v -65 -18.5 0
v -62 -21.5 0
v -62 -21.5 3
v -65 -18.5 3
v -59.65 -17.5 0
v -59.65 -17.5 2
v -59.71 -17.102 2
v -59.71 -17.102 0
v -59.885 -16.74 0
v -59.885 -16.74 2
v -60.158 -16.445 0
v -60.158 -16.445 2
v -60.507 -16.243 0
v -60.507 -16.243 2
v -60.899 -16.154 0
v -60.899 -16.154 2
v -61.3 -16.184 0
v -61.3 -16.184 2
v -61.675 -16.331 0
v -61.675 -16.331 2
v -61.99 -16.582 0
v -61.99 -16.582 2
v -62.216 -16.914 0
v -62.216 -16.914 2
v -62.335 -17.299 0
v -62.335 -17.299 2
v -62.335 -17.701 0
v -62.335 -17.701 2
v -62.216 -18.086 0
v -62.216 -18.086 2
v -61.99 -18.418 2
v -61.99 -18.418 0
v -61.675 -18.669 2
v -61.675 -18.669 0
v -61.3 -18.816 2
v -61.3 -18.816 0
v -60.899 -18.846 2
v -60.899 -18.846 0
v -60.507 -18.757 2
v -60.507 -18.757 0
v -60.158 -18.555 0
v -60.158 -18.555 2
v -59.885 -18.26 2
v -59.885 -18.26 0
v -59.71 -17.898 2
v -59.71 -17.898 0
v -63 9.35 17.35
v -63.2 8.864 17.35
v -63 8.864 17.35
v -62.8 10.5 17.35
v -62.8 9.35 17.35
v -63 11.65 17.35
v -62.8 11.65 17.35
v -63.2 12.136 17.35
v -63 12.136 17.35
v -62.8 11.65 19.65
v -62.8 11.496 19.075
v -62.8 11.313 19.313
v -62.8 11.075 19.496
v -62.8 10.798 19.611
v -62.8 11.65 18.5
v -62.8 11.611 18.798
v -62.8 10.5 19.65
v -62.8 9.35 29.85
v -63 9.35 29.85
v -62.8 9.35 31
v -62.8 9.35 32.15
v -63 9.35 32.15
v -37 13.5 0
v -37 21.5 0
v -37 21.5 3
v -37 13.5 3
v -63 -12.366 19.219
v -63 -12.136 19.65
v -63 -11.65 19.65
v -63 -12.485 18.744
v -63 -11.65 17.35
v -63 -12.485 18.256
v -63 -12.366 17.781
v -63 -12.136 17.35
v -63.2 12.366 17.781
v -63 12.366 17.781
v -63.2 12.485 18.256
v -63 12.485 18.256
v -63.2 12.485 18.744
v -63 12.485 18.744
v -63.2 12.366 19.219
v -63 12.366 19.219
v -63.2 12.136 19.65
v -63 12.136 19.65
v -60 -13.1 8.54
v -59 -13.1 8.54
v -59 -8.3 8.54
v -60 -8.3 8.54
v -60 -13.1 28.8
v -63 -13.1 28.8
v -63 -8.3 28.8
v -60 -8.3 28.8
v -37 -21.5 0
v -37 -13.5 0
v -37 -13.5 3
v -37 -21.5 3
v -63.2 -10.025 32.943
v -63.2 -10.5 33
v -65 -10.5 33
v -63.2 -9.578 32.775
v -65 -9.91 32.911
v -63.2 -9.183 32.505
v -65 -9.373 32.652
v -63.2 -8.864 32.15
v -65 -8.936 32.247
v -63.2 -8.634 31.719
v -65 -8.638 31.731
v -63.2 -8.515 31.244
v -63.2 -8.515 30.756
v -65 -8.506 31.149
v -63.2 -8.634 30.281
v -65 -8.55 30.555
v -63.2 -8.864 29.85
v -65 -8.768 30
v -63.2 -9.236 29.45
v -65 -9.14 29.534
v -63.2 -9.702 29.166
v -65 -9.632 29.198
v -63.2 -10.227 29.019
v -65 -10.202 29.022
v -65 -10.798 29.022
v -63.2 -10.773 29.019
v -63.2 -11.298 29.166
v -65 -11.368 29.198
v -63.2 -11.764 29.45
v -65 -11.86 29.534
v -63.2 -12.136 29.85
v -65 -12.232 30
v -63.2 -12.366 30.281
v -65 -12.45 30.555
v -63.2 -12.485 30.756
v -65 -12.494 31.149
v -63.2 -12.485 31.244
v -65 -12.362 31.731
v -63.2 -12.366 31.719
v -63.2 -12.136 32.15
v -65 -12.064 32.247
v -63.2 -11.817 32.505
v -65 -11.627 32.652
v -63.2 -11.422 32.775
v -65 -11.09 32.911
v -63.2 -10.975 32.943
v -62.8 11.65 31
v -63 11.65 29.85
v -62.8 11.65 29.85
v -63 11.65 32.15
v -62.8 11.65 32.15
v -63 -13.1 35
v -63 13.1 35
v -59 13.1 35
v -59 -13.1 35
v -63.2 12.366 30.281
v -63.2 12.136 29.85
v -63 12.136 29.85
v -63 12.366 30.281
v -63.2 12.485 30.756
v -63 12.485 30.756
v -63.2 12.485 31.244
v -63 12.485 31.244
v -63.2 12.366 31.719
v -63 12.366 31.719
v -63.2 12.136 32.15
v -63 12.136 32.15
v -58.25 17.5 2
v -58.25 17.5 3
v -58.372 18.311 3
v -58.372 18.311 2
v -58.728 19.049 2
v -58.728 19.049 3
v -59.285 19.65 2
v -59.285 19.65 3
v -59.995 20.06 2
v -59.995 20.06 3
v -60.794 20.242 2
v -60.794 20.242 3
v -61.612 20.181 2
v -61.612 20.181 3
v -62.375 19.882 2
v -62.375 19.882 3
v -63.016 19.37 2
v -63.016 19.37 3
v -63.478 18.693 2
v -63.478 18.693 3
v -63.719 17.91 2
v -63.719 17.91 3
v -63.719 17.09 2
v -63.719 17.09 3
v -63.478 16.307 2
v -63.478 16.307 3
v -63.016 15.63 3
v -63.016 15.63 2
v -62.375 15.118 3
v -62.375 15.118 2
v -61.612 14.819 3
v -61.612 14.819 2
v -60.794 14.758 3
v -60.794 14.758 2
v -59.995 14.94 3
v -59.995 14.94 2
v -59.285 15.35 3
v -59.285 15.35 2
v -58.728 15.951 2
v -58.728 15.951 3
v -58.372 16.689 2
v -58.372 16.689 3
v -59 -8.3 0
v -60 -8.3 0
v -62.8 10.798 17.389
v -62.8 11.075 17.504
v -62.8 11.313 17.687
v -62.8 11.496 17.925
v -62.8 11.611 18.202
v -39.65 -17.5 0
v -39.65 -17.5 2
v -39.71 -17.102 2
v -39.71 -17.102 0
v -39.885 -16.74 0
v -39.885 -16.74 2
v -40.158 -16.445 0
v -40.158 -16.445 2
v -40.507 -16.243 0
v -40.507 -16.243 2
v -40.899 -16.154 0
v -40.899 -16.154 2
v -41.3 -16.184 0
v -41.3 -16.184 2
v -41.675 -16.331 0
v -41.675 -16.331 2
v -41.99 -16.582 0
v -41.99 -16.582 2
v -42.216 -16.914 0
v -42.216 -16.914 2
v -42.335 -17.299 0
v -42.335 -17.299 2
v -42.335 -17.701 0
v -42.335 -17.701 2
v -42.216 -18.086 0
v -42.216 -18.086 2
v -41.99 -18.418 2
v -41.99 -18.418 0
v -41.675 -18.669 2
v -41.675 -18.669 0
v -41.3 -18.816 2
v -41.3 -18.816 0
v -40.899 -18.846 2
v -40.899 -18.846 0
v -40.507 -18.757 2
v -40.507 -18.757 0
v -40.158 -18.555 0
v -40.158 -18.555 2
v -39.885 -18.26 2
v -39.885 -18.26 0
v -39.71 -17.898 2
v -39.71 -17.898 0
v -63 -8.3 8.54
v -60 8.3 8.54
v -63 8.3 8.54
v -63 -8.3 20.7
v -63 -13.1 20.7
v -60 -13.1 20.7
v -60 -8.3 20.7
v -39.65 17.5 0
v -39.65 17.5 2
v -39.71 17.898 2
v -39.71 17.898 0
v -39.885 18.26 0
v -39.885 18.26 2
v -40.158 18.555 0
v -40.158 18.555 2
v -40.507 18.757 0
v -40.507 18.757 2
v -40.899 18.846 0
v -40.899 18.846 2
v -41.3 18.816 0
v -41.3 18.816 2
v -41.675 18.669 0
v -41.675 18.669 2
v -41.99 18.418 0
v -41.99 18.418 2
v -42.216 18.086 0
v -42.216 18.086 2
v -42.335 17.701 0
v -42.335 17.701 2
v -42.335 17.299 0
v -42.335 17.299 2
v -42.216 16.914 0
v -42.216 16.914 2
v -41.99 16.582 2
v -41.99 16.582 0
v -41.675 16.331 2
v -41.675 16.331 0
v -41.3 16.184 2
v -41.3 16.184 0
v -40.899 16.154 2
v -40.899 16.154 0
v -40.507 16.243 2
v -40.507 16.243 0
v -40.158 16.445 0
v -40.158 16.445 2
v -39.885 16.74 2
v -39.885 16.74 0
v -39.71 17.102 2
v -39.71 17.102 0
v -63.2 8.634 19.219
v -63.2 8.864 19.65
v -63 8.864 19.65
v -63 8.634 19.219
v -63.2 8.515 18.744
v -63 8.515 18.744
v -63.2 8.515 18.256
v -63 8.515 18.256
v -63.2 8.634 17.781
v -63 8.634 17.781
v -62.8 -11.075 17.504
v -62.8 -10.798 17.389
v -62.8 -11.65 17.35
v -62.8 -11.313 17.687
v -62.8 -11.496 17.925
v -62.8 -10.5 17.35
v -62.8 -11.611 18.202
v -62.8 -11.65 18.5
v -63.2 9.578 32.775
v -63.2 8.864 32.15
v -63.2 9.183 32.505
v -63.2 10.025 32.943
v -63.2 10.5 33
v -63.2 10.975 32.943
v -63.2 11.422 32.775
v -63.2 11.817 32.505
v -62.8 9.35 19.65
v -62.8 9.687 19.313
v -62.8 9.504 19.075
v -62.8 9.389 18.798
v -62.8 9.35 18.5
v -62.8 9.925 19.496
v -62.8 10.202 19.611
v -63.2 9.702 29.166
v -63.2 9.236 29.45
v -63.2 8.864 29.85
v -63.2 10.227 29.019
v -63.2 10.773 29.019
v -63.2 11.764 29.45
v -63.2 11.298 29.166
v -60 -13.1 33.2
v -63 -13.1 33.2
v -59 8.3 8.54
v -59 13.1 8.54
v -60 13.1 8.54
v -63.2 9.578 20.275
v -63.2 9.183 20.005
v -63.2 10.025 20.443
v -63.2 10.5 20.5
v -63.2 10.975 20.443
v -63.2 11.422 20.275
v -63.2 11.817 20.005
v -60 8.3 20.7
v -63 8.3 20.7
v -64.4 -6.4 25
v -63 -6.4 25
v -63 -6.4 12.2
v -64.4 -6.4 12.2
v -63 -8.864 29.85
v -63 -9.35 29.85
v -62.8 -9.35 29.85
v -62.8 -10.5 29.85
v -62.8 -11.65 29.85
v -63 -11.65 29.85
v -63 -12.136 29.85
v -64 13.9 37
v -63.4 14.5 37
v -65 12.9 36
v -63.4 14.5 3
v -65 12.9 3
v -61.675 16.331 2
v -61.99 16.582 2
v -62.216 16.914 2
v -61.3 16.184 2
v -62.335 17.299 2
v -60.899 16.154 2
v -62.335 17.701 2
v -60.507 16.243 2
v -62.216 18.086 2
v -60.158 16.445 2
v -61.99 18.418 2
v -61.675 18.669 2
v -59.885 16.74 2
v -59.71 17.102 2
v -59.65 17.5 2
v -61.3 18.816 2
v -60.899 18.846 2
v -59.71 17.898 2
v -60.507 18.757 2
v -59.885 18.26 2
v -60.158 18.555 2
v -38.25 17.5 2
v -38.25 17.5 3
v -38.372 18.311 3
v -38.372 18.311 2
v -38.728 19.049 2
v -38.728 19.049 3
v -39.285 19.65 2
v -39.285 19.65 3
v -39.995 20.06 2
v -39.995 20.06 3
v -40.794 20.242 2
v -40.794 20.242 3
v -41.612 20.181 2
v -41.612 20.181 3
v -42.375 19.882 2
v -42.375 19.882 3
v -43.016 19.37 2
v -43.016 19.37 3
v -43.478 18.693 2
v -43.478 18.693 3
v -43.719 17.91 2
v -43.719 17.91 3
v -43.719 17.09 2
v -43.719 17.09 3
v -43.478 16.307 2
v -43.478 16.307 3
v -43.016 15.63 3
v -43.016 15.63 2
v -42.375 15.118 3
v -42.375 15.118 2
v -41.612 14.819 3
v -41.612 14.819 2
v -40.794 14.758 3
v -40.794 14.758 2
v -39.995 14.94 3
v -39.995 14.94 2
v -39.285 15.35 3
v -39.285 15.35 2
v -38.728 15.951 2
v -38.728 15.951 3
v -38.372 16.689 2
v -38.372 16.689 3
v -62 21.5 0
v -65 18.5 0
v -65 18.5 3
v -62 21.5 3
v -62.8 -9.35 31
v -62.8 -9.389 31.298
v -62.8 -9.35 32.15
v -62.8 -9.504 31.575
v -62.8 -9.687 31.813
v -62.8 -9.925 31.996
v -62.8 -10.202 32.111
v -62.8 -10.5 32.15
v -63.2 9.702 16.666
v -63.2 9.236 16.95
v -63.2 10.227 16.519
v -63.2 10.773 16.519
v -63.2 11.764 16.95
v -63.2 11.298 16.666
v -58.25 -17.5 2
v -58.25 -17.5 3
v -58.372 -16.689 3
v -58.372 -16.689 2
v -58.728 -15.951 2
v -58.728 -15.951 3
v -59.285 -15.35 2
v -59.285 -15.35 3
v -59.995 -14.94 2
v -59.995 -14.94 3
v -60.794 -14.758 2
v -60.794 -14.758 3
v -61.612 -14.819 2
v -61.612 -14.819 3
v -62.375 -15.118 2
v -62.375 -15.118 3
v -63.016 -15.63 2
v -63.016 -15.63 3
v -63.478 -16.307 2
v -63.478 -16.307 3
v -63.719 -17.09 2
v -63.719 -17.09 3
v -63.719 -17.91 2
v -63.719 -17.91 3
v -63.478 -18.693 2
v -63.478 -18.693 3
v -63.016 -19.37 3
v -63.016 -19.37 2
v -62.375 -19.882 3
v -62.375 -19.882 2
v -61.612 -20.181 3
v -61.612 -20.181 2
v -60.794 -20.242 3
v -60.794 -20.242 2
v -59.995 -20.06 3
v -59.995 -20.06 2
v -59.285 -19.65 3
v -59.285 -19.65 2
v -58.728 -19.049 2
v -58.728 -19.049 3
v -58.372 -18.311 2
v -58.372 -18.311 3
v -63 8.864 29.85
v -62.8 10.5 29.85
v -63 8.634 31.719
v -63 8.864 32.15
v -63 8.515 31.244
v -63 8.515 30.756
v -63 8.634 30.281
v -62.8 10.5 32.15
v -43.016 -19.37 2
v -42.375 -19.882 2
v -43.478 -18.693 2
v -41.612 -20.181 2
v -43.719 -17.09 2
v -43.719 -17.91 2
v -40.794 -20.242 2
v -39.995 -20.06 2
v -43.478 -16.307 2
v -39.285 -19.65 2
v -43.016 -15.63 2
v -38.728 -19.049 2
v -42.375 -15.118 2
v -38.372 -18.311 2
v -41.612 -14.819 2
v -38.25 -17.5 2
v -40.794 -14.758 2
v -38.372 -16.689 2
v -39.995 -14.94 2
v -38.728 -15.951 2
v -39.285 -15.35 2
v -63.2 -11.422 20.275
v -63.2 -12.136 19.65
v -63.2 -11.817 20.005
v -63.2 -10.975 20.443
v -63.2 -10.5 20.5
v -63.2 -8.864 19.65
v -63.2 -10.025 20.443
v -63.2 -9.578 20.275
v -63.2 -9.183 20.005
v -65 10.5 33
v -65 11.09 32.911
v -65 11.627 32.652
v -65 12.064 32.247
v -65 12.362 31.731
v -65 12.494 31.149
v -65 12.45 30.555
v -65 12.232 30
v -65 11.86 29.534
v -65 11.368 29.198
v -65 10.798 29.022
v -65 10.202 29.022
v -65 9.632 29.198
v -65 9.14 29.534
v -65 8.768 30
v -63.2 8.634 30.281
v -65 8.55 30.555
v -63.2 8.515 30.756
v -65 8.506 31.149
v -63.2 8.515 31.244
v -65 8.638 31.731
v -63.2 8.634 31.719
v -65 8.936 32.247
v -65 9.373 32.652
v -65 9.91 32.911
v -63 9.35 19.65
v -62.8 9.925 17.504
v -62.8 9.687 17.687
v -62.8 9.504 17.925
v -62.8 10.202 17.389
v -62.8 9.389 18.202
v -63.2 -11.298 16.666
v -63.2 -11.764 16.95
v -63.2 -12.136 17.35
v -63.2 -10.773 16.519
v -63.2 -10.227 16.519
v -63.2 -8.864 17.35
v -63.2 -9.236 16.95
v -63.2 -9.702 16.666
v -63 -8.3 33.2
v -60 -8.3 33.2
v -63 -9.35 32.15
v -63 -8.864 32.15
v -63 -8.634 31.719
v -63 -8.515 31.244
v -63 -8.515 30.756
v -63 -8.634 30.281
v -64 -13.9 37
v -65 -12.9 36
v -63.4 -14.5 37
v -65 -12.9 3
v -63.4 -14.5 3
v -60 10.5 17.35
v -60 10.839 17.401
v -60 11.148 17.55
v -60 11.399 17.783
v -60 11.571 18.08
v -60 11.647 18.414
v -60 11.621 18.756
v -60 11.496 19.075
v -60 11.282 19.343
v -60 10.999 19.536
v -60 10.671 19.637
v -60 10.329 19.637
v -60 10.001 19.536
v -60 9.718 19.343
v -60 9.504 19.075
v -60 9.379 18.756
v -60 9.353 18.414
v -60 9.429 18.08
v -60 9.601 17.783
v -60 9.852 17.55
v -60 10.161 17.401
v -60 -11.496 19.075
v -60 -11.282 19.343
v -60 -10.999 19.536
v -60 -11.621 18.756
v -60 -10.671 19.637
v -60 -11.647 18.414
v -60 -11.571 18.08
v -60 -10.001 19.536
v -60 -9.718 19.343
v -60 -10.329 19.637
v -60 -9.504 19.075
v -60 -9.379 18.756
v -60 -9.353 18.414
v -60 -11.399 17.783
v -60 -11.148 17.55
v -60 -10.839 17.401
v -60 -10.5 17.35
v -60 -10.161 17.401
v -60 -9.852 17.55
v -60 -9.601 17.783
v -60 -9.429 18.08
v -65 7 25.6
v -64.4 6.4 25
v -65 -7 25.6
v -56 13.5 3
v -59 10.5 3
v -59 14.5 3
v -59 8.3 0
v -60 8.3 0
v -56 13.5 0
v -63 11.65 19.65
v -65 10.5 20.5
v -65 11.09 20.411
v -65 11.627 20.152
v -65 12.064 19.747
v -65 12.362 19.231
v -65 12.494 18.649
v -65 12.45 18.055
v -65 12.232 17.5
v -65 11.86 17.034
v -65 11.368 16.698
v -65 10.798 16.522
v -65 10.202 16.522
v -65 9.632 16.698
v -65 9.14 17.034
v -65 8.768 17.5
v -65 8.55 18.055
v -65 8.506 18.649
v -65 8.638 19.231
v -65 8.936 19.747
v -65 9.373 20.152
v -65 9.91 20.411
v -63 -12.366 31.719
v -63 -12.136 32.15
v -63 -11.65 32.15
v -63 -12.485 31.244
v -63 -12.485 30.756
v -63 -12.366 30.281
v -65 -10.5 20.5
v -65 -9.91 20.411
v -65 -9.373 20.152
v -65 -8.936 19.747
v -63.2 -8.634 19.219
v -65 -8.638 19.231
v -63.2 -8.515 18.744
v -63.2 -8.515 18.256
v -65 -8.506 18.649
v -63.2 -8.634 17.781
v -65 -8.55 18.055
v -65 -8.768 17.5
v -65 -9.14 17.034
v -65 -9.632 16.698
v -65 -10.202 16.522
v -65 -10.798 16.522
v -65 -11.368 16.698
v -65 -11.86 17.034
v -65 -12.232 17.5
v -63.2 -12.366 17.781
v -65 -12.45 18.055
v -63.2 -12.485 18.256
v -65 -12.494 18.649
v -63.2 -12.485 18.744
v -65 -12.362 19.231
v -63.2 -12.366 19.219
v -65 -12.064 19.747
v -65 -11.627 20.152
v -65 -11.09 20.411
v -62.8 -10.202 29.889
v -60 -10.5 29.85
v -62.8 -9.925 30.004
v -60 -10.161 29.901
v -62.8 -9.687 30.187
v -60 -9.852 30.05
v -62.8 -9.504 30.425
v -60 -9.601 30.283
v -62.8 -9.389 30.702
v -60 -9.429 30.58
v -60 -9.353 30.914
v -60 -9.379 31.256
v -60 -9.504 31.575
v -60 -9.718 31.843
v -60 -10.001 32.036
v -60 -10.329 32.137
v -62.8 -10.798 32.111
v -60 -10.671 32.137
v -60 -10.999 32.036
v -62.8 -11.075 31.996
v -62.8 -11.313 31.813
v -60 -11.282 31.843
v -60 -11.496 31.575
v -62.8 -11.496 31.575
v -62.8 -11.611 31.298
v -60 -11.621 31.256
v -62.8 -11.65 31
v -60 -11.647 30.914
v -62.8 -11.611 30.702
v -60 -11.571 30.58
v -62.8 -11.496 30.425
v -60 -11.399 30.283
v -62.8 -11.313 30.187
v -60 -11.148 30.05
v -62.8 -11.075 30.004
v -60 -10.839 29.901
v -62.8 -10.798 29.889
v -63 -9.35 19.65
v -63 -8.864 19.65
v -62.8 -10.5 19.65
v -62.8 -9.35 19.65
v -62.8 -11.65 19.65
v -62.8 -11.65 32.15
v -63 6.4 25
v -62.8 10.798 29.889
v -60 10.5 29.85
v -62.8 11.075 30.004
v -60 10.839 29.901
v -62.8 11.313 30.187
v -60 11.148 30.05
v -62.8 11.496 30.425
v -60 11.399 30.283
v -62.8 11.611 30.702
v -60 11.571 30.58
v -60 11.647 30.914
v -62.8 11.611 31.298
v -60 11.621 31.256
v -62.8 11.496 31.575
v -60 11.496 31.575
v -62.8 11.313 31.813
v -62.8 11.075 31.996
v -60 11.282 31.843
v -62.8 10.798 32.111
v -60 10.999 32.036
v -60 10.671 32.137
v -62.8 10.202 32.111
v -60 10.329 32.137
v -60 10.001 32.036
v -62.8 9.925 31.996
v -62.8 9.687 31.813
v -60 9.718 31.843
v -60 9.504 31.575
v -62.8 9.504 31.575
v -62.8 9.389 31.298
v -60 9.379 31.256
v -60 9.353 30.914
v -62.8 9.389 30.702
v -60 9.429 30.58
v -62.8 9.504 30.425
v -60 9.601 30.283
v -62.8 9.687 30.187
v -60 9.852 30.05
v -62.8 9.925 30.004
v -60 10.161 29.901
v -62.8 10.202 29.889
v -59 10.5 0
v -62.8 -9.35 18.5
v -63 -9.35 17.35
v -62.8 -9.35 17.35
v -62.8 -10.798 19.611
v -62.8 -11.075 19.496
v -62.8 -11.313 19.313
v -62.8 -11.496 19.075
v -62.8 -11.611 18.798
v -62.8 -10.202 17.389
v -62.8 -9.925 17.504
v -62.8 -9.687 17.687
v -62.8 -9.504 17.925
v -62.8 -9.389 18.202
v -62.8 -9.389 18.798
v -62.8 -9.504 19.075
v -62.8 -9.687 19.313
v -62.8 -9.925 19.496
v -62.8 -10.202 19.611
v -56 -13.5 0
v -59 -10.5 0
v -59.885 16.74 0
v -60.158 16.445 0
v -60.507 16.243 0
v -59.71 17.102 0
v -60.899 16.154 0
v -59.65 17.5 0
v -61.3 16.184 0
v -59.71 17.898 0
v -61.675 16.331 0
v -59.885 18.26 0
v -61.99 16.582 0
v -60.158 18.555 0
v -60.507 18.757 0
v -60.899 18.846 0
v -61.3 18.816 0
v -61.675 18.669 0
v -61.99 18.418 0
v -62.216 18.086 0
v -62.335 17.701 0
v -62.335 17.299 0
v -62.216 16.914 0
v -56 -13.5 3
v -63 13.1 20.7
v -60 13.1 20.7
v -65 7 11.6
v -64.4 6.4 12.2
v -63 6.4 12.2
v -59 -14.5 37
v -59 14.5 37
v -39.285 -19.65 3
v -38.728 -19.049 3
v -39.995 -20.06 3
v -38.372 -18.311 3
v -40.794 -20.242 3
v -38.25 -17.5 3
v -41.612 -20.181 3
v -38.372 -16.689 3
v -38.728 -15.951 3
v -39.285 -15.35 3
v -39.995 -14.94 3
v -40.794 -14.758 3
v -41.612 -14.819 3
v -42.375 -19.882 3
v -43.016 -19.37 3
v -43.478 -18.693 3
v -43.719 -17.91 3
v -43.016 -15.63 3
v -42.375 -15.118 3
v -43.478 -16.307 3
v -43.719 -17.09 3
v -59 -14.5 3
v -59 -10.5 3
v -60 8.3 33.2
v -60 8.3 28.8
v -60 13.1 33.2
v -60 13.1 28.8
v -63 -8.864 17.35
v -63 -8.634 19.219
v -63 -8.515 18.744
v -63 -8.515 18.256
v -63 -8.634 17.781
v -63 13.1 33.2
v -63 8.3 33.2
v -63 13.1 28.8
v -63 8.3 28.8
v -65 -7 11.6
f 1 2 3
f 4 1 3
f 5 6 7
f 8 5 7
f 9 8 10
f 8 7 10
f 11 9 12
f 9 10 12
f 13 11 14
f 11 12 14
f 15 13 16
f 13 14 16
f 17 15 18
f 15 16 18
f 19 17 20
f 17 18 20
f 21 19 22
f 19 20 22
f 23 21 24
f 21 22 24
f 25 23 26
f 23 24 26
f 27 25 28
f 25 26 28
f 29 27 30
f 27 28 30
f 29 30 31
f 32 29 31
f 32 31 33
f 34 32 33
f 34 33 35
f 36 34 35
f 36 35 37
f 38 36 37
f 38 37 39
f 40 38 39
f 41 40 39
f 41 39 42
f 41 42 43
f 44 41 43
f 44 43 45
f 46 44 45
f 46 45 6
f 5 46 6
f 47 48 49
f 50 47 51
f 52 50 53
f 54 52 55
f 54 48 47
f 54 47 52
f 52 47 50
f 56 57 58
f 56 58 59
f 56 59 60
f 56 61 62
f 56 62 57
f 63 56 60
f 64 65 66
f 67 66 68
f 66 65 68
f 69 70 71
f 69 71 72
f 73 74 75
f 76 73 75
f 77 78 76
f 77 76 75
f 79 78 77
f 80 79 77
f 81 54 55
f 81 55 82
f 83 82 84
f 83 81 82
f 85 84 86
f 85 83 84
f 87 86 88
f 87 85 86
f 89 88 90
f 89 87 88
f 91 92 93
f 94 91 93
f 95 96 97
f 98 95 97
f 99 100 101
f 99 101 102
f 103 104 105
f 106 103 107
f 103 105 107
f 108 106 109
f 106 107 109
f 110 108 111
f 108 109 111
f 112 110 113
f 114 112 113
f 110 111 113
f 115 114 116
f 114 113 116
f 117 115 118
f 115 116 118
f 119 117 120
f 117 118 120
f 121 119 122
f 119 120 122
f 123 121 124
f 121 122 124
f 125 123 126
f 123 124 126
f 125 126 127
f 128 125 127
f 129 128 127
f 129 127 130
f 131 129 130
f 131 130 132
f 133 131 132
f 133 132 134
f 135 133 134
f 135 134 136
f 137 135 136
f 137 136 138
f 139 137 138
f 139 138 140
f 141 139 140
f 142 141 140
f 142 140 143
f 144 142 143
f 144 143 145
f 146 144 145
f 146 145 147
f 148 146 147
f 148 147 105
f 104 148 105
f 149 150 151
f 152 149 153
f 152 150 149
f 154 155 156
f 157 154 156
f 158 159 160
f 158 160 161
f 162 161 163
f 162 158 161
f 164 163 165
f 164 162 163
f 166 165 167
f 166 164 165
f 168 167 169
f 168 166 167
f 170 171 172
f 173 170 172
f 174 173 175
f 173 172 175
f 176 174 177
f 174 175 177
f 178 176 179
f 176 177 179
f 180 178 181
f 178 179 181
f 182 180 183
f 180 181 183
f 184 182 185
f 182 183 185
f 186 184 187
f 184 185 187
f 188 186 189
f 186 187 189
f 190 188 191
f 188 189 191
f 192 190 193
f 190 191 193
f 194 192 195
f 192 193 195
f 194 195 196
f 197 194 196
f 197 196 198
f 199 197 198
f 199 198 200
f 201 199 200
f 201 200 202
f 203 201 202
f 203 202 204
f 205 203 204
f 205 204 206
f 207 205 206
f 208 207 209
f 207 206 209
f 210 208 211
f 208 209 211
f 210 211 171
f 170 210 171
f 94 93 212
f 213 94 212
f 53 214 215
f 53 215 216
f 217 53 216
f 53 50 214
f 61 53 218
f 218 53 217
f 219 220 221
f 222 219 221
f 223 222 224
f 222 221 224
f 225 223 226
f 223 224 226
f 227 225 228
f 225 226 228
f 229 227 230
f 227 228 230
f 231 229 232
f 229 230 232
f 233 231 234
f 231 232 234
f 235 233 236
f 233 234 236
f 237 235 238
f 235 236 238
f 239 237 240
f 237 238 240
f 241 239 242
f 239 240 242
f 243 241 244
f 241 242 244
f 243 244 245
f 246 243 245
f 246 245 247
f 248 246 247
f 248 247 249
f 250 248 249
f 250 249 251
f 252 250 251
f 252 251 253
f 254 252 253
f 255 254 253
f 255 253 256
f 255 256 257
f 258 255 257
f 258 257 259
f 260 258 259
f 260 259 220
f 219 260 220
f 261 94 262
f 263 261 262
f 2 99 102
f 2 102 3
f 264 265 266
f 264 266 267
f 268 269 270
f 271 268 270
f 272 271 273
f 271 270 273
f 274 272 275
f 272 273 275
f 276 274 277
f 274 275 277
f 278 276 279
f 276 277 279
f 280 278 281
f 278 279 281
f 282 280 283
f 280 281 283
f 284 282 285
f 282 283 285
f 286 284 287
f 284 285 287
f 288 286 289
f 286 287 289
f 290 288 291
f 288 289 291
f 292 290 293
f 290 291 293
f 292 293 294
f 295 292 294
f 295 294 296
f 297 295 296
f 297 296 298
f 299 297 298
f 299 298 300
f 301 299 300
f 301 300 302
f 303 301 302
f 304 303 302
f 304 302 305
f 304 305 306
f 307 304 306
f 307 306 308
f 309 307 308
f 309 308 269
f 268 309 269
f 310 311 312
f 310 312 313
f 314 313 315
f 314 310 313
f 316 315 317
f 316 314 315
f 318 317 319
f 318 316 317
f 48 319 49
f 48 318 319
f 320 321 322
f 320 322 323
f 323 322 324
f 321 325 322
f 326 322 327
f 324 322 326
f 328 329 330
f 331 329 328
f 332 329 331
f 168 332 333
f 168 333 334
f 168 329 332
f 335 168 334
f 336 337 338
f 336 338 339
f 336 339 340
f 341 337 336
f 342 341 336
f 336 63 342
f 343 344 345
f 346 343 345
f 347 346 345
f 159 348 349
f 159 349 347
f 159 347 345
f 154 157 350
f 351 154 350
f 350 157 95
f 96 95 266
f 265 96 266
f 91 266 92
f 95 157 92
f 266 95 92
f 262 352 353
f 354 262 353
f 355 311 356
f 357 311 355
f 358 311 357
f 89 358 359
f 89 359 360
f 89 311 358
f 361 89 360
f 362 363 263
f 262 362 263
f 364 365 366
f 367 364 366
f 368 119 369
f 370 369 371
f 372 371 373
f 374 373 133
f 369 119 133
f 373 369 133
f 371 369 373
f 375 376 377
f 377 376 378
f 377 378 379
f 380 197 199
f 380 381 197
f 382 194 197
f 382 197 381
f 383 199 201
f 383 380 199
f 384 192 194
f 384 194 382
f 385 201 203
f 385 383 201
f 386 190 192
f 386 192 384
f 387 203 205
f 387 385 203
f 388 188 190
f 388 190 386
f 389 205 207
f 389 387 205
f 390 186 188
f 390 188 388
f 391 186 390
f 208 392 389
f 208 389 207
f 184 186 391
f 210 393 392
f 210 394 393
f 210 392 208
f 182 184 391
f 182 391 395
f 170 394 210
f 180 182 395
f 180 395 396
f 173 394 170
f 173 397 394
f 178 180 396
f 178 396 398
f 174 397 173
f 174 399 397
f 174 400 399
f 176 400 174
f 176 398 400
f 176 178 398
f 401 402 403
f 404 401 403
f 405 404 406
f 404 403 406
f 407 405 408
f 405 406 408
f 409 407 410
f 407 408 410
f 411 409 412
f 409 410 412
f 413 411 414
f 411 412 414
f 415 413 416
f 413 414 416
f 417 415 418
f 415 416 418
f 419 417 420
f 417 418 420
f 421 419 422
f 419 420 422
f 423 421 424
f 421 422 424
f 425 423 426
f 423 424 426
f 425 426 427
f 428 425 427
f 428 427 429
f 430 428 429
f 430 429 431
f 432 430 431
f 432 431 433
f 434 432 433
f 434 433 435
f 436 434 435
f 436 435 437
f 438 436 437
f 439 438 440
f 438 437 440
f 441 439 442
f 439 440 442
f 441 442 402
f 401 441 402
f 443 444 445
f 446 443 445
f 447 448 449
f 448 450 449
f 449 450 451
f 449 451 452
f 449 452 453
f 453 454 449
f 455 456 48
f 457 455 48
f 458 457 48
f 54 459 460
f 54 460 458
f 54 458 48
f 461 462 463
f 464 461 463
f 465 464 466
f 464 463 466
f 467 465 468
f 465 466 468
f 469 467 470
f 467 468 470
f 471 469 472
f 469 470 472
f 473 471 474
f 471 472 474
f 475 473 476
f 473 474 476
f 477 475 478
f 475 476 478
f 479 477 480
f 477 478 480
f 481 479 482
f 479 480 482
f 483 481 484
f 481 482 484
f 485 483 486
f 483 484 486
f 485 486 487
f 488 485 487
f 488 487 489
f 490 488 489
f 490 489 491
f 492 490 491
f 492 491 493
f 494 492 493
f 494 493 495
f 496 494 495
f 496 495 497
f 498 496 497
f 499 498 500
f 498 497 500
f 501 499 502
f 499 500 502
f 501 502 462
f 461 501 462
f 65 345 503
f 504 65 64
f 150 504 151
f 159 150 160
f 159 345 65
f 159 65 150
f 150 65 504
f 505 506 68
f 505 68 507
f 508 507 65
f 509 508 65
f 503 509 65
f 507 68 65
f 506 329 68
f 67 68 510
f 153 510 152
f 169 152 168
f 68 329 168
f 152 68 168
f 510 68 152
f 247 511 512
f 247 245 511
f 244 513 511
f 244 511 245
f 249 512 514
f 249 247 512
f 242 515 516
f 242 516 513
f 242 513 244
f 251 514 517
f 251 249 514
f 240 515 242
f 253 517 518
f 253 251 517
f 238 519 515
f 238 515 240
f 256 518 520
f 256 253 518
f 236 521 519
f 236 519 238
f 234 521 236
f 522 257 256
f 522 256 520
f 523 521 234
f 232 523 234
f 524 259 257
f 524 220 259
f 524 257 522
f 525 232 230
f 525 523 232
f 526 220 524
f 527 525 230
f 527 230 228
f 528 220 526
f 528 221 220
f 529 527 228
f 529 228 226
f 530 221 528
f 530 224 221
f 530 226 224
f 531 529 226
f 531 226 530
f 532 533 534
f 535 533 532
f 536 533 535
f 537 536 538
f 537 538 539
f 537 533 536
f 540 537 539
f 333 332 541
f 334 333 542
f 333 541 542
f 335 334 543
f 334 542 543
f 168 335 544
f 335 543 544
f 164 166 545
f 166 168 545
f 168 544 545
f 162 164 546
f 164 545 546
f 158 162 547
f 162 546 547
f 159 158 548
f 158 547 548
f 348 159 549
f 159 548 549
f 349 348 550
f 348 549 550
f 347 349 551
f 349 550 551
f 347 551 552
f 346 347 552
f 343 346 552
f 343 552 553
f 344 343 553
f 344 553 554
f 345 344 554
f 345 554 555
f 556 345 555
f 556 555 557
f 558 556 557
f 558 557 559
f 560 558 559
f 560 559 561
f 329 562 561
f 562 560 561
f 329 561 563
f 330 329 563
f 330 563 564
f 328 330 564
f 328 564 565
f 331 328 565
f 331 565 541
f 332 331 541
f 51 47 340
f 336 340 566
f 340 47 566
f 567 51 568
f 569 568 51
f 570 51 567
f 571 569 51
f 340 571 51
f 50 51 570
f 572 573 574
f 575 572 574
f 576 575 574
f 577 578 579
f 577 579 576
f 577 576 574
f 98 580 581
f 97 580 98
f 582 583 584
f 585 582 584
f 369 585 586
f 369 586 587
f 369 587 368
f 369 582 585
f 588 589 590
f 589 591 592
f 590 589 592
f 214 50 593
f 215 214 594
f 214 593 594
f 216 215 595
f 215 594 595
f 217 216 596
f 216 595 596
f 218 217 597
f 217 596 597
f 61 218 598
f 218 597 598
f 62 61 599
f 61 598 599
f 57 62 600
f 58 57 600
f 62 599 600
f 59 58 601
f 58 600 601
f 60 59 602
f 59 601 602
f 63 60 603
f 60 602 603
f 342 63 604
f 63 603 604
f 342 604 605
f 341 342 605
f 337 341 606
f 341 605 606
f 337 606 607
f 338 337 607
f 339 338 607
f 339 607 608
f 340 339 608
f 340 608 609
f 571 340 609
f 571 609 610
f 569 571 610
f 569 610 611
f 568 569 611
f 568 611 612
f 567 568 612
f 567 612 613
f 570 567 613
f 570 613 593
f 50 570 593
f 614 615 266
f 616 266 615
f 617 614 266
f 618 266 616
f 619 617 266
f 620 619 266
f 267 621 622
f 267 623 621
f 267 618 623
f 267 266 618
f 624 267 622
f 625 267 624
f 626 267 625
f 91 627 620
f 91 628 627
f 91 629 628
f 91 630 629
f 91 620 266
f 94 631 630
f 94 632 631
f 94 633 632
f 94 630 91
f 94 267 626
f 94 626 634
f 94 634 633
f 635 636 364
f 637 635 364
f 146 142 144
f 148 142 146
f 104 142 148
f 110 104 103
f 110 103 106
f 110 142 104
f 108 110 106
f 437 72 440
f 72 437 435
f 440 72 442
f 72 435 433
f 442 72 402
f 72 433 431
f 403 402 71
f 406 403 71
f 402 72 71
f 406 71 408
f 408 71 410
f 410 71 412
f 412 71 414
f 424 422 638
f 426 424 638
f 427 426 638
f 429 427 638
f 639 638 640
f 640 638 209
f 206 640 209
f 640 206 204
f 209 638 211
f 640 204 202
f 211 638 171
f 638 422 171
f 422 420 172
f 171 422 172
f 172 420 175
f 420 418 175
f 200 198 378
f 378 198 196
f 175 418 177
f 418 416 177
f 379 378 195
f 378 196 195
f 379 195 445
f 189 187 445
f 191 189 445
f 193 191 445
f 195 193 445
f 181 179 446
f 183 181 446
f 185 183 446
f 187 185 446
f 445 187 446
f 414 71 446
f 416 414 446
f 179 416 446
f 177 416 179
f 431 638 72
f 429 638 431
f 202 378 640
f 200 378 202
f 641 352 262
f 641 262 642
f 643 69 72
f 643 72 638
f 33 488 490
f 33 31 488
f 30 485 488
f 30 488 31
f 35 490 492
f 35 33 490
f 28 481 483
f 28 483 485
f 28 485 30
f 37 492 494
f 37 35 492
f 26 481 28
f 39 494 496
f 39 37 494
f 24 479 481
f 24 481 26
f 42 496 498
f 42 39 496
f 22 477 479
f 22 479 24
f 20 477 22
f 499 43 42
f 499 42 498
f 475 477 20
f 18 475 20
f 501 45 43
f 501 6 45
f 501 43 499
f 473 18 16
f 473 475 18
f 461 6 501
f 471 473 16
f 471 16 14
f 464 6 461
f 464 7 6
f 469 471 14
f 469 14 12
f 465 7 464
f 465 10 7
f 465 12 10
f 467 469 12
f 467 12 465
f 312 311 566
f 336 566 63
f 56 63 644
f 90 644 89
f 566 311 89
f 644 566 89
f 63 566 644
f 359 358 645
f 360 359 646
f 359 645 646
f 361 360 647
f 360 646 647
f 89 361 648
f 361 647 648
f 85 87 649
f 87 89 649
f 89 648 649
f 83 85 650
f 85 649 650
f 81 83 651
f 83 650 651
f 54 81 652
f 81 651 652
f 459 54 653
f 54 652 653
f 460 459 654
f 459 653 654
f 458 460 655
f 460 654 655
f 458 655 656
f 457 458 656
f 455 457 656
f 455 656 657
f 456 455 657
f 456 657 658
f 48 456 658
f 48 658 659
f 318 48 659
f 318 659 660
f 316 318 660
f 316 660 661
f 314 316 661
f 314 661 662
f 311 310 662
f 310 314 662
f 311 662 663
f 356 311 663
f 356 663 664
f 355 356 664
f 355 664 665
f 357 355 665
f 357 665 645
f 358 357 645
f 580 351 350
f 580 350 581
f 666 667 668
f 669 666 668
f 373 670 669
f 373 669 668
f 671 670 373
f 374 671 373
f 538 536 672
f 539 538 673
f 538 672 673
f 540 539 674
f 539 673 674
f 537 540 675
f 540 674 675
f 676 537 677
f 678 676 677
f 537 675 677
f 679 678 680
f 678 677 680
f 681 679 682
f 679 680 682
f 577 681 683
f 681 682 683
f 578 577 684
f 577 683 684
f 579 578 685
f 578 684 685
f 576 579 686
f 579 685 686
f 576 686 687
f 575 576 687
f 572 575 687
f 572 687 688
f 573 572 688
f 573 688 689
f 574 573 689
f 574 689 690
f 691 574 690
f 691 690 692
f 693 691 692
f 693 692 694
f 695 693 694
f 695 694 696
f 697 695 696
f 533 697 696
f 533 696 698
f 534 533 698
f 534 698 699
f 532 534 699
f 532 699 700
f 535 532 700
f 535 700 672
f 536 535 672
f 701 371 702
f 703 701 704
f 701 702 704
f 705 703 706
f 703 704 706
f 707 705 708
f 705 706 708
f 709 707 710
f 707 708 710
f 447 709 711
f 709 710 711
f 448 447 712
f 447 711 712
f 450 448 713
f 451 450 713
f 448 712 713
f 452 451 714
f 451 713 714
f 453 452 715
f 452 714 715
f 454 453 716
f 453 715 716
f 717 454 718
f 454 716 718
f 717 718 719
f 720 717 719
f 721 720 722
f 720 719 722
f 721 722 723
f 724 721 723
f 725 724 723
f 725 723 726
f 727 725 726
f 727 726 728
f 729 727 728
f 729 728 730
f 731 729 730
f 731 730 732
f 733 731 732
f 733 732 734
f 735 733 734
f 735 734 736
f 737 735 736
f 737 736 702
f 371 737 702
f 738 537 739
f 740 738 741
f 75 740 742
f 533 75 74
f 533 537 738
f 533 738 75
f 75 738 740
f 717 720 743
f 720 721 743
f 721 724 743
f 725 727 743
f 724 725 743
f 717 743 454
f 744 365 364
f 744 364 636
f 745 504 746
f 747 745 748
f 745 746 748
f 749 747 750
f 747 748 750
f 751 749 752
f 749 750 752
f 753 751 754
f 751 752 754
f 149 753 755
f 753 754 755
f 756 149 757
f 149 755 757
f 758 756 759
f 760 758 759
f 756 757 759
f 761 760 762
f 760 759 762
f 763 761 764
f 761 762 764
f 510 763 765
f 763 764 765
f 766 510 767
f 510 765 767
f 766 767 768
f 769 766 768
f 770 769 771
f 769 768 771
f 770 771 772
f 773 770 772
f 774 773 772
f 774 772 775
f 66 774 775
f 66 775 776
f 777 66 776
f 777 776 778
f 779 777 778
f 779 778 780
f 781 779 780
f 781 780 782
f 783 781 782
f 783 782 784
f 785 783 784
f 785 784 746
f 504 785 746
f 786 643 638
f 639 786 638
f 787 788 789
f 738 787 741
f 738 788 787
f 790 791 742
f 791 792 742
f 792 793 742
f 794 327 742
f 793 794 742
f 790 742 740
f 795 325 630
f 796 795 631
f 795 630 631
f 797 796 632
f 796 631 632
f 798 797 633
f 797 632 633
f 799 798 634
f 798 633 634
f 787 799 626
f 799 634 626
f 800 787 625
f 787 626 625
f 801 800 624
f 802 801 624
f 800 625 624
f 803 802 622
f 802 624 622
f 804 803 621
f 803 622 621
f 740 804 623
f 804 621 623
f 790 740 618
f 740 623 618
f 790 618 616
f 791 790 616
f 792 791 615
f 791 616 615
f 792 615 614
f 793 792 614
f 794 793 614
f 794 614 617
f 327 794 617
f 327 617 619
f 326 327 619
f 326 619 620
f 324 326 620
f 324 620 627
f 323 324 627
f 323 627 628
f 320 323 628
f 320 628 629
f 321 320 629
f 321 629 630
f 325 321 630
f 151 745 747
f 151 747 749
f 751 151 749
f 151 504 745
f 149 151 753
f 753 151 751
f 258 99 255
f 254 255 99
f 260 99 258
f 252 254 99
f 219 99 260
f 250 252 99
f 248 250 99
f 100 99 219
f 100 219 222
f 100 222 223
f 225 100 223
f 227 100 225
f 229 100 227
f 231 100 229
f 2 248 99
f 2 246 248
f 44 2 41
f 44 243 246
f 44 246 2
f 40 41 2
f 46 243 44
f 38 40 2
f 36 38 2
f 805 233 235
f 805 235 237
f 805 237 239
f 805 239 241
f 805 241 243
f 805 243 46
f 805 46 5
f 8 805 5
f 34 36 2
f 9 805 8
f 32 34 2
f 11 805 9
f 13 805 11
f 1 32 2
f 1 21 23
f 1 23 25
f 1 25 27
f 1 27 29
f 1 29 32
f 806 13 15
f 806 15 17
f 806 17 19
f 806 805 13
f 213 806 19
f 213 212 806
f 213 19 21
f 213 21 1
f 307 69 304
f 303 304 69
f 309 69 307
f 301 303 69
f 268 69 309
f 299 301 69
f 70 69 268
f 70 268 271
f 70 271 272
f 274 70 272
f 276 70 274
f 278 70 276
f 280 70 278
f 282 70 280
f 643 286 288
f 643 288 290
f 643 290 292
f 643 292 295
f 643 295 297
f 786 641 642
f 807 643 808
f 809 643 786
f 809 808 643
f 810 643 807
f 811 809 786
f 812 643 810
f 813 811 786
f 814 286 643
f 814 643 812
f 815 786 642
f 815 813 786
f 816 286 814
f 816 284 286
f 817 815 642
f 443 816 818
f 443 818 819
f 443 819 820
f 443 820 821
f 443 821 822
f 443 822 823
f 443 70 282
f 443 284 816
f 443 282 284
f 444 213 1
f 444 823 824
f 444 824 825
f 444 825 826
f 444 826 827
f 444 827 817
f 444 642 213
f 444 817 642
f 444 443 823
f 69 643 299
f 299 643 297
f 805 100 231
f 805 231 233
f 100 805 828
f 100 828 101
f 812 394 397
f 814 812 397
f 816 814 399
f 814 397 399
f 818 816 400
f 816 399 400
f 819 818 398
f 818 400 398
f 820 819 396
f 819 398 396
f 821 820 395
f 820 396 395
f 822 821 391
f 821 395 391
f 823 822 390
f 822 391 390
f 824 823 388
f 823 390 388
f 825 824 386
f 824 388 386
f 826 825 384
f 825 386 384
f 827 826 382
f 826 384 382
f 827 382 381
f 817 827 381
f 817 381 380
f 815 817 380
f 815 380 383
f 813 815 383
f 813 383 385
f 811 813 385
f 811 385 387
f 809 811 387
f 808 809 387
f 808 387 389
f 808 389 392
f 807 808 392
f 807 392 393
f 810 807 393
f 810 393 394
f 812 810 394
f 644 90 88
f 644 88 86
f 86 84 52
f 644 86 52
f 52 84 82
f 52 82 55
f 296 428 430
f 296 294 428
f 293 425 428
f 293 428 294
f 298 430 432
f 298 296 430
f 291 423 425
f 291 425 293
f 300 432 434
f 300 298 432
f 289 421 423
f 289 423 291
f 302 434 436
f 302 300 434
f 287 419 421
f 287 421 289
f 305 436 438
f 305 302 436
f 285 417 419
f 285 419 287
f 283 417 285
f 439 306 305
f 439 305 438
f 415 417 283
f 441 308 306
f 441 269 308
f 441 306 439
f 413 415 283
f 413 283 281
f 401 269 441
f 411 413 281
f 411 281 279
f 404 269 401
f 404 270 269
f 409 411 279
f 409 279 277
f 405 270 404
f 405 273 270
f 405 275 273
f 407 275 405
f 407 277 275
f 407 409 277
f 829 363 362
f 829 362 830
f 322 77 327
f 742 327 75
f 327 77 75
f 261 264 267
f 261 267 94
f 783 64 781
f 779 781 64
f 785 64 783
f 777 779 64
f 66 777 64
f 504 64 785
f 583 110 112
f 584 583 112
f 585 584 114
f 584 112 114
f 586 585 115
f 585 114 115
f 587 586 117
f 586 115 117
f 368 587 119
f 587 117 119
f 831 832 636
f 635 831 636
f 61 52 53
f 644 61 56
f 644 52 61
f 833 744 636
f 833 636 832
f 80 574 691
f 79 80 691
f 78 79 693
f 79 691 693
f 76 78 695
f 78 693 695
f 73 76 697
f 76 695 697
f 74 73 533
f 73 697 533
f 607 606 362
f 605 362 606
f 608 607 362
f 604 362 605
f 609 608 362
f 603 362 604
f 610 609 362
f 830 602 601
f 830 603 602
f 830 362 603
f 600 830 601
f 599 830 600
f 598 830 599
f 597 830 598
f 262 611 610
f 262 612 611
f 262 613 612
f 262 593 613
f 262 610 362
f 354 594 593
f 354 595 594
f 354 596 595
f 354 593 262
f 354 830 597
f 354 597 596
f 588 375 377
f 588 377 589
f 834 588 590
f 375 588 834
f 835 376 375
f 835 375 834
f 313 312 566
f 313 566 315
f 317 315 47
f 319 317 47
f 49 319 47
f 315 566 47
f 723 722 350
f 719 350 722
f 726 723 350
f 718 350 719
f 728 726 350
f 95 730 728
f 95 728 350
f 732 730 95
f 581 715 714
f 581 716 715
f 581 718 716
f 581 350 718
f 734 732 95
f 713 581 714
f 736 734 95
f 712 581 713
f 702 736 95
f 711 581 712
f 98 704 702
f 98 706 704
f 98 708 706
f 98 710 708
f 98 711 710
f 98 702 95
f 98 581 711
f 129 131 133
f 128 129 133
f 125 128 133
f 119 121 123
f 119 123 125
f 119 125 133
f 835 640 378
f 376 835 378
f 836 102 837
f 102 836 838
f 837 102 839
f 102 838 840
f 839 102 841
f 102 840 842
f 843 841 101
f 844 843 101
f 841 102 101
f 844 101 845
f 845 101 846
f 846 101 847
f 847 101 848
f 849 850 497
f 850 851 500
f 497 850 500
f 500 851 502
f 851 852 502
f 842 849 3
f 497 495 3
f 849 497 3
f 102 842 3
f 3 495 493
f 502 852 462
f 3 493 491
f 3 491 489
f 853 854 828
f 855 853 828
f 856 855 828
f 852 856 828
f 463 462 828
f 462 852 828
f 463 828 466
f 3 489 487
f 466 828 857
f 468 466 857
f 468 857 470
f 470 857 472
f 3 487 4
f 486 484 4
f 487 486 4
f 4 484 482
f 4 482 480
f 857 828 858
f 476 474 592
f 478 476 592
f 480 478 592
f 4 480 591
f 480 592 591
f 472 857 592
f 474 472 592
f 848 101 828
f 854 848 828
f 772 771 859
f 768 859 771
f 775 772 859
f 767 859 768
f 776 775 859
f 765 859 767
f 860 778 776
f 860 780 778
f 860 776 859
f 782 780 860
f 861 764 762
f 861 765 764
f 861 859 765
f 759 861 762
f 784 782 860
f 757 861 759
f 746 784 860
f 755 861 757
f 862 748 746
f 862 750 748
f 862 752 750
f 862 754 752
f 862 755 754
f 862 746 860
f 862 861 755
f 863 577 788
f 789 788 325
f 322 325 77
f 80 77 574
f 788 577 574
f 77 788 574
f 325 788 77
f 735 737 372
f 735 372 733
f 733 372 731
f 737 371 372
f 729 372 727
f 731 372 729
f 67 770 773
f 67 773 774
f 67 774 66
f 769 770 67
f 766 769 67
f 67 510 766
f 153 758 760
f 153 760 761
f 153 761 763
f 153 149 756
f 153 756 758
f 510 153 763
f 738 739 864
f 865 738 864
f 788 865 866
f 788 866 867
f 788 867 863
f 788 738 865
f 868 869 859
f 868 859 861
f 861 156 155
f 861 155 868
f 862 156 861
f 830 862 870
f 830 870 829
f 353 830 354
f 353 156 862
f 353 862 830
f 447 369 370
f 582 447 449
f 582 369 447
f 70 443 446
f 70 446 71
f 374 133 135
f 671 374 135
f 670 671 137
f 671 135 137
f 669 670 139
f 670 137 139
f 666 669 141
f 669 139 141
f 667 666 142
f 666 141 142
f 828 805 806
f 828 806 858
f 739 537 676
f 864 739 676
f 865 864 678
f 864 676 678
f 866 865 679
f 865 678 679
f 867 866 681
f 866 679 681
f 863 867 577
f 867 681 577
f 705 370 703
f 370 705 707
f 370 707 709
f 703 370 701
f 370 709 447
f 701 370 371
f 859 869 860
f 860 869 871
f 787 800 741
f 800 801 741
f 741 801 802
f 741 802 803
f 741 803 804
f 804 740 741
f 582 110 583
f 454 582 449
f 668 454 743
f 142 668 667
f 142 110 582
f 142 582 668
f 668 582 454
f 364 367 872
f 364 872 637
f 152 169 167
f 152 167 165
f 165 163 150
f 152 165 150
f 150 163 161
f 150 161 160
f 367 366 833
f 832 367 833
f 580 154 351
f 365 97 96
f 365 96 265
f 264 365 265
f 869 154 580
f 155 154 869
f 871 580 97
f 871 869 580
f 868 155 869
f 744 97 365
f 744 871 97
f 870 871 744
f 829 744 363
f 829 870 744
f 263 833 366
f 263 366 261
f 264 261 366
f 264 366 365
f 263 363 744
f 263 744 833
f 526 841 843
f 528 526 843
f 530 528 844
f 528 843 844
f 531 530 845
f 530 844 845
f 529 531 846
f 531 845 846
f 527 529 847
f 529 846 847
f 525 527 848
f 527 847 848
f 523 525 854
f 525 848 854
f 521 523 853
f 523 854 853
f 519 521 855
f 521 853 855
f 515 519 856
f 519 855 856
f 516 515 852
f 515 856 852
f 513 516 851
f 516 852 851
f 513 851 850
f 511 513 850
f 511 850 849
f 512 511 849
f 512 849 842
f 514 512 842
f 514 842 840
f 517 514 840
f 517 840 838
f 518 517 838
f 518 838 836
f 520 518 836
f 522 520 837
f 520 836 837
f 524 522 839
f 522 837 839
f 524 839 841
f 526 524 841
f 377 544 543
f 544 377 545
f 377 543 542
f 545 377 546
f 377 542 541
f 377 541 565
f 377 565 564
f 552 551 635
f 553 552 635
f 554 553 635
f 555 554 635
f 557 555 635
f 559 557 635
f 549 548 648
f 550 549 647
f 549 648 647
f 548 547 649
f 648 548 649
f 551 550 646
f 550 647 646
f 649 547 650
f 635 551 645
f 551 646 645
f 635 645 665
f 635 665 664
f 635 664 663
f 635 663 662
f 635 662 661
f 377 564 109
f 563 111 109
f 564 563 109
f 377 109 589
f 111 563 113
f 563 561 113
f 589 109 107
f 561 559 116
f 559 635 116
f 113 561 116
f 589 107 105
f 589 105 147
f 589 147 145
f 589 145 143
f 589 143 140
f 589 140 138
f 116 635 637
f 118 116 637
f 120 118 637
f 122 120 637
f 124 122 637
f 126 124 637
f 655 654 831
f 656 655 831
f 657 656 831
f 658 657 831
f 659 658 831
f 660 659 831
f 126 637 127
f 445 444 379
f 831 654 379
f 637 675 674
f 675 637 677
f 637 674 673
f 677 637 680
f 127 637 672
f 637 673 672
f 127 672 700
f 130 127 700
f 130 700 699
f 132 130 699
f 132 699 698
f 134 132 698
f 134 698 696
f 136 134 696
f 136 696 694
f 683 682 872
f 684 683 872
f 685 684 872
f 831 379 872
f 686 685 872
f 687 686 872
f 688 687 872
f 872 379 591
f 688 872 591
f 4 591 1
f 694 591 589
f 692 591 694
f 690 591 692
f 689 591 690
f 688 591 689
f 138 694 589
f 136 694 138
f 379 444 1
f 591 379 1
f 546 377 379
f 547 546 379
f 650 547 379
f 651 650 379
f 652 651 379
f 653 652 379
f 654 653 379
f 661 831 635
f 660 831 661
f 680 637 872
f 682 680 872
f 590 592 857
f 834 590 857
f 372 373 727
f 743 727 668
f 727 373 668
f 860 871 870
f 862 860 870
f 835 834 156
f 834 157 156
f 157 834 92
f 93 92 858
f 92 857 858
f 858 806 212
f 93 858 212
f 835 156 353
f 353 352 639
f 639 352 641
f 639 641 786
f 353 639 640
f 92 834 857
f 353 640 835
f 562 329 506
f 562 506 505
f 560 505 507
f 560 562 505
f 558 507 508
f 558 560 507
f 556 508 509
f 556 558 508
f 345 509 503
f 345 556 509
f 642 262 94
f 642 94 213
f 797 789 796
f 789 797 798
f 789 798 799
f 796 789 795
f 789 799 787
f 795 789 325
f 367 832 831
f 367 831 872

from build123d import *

# Parameters (mm, degrees)
BOSS_EXTRUDE1_DEPTH  = 3
SKETCH3_R            = 1.35
CUT_EXTRUDE1_DEPTH   = 4
SKETCH4_W            = 6
SKETCH4_H            = 27
BOSS_EXTRUDE2_DEPTH  = 32
SKETCH5_R            = 9
CUT_EXTRUDE2_DEPTH   = 29
SKETCH6_W            = 8
SKETCH6_H            = 25
CUT_EXTRUDE3_DEPTH   = 3
SKETCH7_R            = 2.5
SKETCH7_R_2          = 1.65
BOSS_EXTRUDE3_DEPTH  = 3
SKETCH8_R            = 1.65
CUT_EXTRUDE4_DEPTH   = 3
CHAMFER1_SIZE        = 0.6
SKETCH9_R            = 2.75
CUT_EXTRUDE5_DEPTH   = 1
CHAMFER2_SIZE        = 3
CHAMFER3_SIZE        = 3
SKETCH10_W           = 32
SKETCH10_H           = 27
CUT_EXTRUDE6_DEPTH   = 20
SKETCH11_R           = 1.65
BOSS_EXTRUDE5_DEPTH  = 3
BOSS_EXTRUDE6_DEPTH  = 3
SKETCH12_R           = 9
BOSS_EXTRUDE7_DEPTH  = 3
SKETCH15_W           = 25.06
SKETCH15_H           = 26.2
CUT_EXTRUDE7_DEPTH   = 4
SKETCH16_W           = 12.8
SKETCH16_H           = 12.8
CUT_EXTRUDE8_DEPTH   = 3
SKETCH17_W           = 12.16
SKETCH17_H           = 4.8
SKETCH17_W_2         = 4.4
BOSS_EXTRUDE8_DEPTH  = 3
SKETCH18_R           = 1.15
CUT_EXTRUDE9_DEPTH   = 6
SKETCH19_R           = 2
CUT_EXTRUDE11_DEPTH  = 1.8
CUT_EXTRUDE13_DEPTH  = 0.2
SKETCH21_W           = 2.3
SKETCH21_H           = 2.3
CUT_EXTRUDE14_DEPTH  = 0.2
CHAMFER4_SIZE        = 0.6
SKETCH22_W           = 1.4
SKETCH22_H           = 26.2
CUT_EXTRUDE15_DEPTH  = 4
BOSS_EXTRUDE9_DEPTH  = 32
SKETCH24_W           = 8.54
SKETCH24_H           = 16.6
CUT_EXTRUDE16_DEPTH  = 1
BOSS_EXTRUDE10_DEPTH = 2
CHAMFER5_SIZE        = 1


with BuildPart() as part:
    # Sketch2 → Boss-Extrude1 (new body)
    with BuildSketch(Plane.XY):
        Polygon((-65, 21.5), (-37, 21.5), (-37, 13.5), (-59, 13.5), (-59, -13.5), (-37, -13.5), (-37, -21.5), (-65, -21.5), align=None)
    extrude(amount=BOSS_EXTRUDE1_DEPTH)

    # Sketch3 → Cut-Extrude1 (cut, through all)
    with BuildSketch(Plane.XY.offset(3)):
        with Locations((-41, 17.5)):
            Circle(SKETCH3_R)
        with Locations((-61, 17.5)):
            Circle(SKETCH3_R)
        with Locations((-61, -17.5)):
            Circle(SKETCH3_R)
        with Locations((-41, -17.5)):
            Circle(SKETCH3_R)
    extrude(amount=-CUT_EXTRUDE1_DEPTH, mode=Mode.SUBTRACT)

    # Sketch4 → Boss-Extrude2 (add)
    with BuildSketch(Plane.XY.offset(3)):
        with Locations((-62, 0)):
            Rectangle(SKETCH4_W, SKETCH4_H)
    extrude(amount=BOSS_EXTRUDE2_DEPTH)

    # Sketch5 → Cut-Extrude2 (cut, through all)
    with BuildSketch(Plane.ZY.offset(65)):
        with Locations((23, 0)):
            Circle(SKETCH5_R)
    extrude(amount=-CUT_EXTRUDE2_DEPTH, mode=Mode.SUBTRACT)

    # Sketch6 → Cut-Extrude3 (cut)
    with BuildSketch(Plane(origin=(-59, 0, 0), x_dir=(0, 0, -1), z_dir=(1, 0, 0))):
        with Locations((-23, 0)):
            Rectangle(SKETCH6_W, SKETCH6_H)
    extrude(amount=-CUT_EXTRUDE3_DEPTH, mode=Mode.SUBTRACT)

    # Sketch7 → Boss-Extrude3 (add)
    with BuildSketch(Plane(origin=(-59, 0, 0), x_dir=(0, 0, -1), z_dir=(1, 0, 0))):
        with Locations((-30, 10.5)):
            Circle(SKETCH7_R)
        with Locations((-30, 10.5)):
            Circle(SKETCH7_R_2, mode=Mode.SUBTRACT)
        with Locations((-16, 10.5)):
            Circle(SKETCH7_R)
        with Locations((-16, 10.5)):
            Circle(SKETCH7_R_2, mode=Mode.SUBTRACT)
        with Locations((-16, -10.5)):
            Circle(SKETCH7_R)
        with Locations((-16, -10.5)):
            Circle(SKETCH7_R_2, mode=Mode.SUBTRACT)
        with Locations((-30, -10.5)):
            Circle(SKETCH7_R)
        with Locations((-30, -10.5)):
            Circle(SKETCH7_R_2, mode=Mode.SUBTRACT)
    extrude(amount=BOSS_EXTRUDE3_DEPTH)

    # Sketch8 → Cut-Extrude4 (cut)
    with BuildSketch(Plane(origin=(-59, 0, 0), x_dir=(0, 0, -1), z_dir=(1, 0, 0))):
        with Locations((-30, -10.5)):
            Circle(SKETCH8_R)
        with Locations((-16, -10.5)):
            Circle(SKETCH8_R)
        with Locations((-16, 10.5)):
            Circle(SKETCH8_R)
        with Locations((-30, 10.5)):
            Circle(SKETCH8_R)
    extrude(amount=-CUT_EXTRUDE4_DEPTH, mode=Mode.SUBTRACT)

    # Chamfer1
    chamfer1_edges = [part.edges().sort_by_distance(p)[0] for p in [
        (-65, 13.5, 19),
        (-65, -13.5, 19),
    ]]
    chamfer(chamfer1_edges, length=CHAMFER1_SIZE)

    # Sketch9 → Cut-Extrude5 (cut)
    with BuildSketch(Plane.XY.offset(3)):
        with Locations((-61, 17.5)):
            Circle(SKETCH9_R)
        with Locations((-41, 17.5)):
            Circle(SKETCH9_R)
        with Locations((-41, -17.5)):
            Circle(SKETCH9_R)
        with Locations((-61, -17.5)):
            Circle(SKETCH9_R)
    extrude(amount=-CUT_EXTRUDE5_DEPTH, mode=Mode.SUBTRACT)

    # Chamfer2
    chamfer2_edges = [part.edges().sort_by_distance(p)[0] for p in [
        (-59, 13.5, 1.5),
        (-59, -13.5, 1.5),
    ]]
    chamfer(chamfer2_edges, length=CHAMFER2_SIZE)

    # Chamfer3
    chamfer3_edges = [part.edges().sort_by_distance(p)[0] for p in [
        (-65, 21.5, 1.5),
        (-65, -21.5, 1.5),
    ]]
    chamfer(chamfer3_edges, length=CHAMFER3_SIZE)

    # Sketch10 → Cut-Extrude6 (cut)
    with BuildSketch(Plane(origin=(-59, 0, 0), x_dir=(0, 0, -1), z_dir=(1, 0, 0))):
        with Locations((-19, 0)):
            Rectangle(SKETCH10_W, SKETCH10_H)
    extrude(amount=CUT_EXTRUDE6_DEPTH, mode=Mode.SUBTRACT)

    # Sketch11 → Boss-Extrude5 (add)
    with BuildSketch(Plane(origin=(-59, 0, 0), x_dir=(0, 0, -1), z_dir=(1, 0, 0))):
        with Locations((-30, 10.5)):
            Circle(SKETCH11_R)
        with Locations((-16, 10.5)):
            Circle(SKETCH11_R)
        with Locations((-16, -10.5)):
            Circle(SKETCH11_R)
        with Locations((-30, -10.5)):
            Circle(SKETCH11_R)
    extrude(amount=-BOSS_EXTRUDE5_DEPTH)

    # Sketch11<3> → Boss-Extrude6 (add)
    with BuildSketch(Plane(origin=(-59, 0, 0), x_dir=(0, 0, -1), z_dir=(1, 0, 0))):
        with BuildLine():
            ThreePointArc((-27, 8.062257748), (-32, 0), (-27, -8.062257748))
            Line((-27, -8.062257748), (-27, -12.5))
            Line((-27, -12.5), (-19, -12.5))
            Line((-19, -12.5), (-19, -8.062257748))
            ThreePointArc((-19, -8.062257748), (-14, 0), (-19, 8.062257748))
            Line((-19, 8.062257748), (-19, 12.5))
            Line((-19, 12.5), (-27, 12.5))
            Line((-27, 12.5), (-27, 8.062257748))
        make_face()
    extrude(amount=-BOSS_EXTRUDE6_DEPTH)

    # Sketch12 → Boss-Extrude7 (add)
    with BuildSketch(Plane.ZY.offset(62)):
        with Locations((23, 0)):
            Circle(SKETCH12_R)
    extrude(amount=BOSS_EXTRUDE7_DEPTH)

    # Sketch15 → Cut-Extrude7 (cut)
    with BuildSketch(Plane(origin=(-59, 0, 0), x_dir=(0, 0, -1), z_dir=(1, 0, 0))):
        with Locations((-21.07, 0)):
            Rectangle(SKETCH15_W, SKETCH15_H)
    extrude(amount=-CUT_EXTRUDE7_DEPTH, mode=Mode.SUBTRACT)

    # Sketch16 → Cut-Extrude8 (cut, through all)
    with BuildSketch(Plane(origin=(-63, 0, 0), x_dir=(0, 0, -1), z_dir=(1, 0, 0))):
        with Locations((-18.6, 0)):
            Rectangle(SKETCH16_W, SKETCH16_H)
    extrude(amount=-CUT_EXTRUDE8_DEPTH, mode=Mode.SUBTRACT)

    # Sketch17 → Boss-Extrude8 (add)
    with BuildSketch(Plane(origin=(-63, 0, 0), x_dir=(0, 0, -1), z_dir=(1, 0, 0))):
        with Locations((-14.62, -10.7)):
            Rectangle(SKETCH17_W, SKETCH17_H)
        with Locations((-31, -10.7)):
            Rectangle(SKETCH17_W_2, SKETCH17_H)
        with Locations((-31, 10.7)):
            Rectangle(SKETCH17_W_2, SKETCH17_H)
        with Locations((-14.62, 10.7)):
            Rectangle(SKETCH17_W, SKETCH17_H)
    extrude(amount=BOSS_EXTRUDE8_DEPTH)

    # Sketch18 → Cut-Extrude9 (cut, through all)
    with BuildSketch(Plane(origin=(-60, 0, 0), x_dir=(0, 0, -1), z_dir=(1, 0, 0))):
        with Locations((-31, 10.5)):
            Circle(SKETCH18_R)
        with Locations((-18.5, 10.5)):
            Circle(SKETCH18_R)
        with Locations((-18.5, -10.5)):
            Circle(SKETCH18_R)
        with Locations((-31, -10.5)):
            Circle(SKETCH18_R)
    extrude(amount=-CUT_EXTRUDE9_DEPTH, mode=Mode.SUBTRACT)

    # Sketch19 → Cut-Extrude11 (cut)
    with BuildSketch(Plane.ZY.offset(65)):
        with Locations((18.5, 10.5)):
            Circle(SKETCH19_R)
        with Locations((31, 10.5)):
            Circle(SKETCH19_R)
        with Locations((31, -10.5)):
            Circle(SKETCH19_R)
        with Locations((18.5, -10.5)):
            Circle(SKETCH19_R)
    extrude(amount=-CUT_EXTRUDE11_DEPTH, mode=Mode.SUBTRACT)

    # Sketch20 → Cut-Extrude13 (cut)
    with BuildSketch(Plane.ZY.offset(63.2)):
        with BuildLine():
            Line((17.35, 8.863693183), (17.35, 12.136306817))
            ThreePointArc((17.35, 12.136306817), (18.5, 12.5), (19.65, 12.136306817))
            Line((19.65, 12.136306817), (19.65, 8.863693183))
            ThreePointArc((19.65, 8.863693183), (18.5, 8.5), (17.35, 8.863693183))
        make_face()
        with BuildLine():
            Line((29.85, 8.863693183), (29.85, 12.136306817))
            ThreePointArc((29.85, 12.136306817), (31, 12.5), (32.15, 12.136306817))
            Line((32.15, 12.136306817), (32.15, 8.863693183))
            ThreePointArc((32.15, 8.863693183), (31, 8.5), (29.85, 8.863693183))
        make_face()
    cut_extrude13 = extrude(amount=-CUT_EXTRUDE13_DEPTH, mode=Mode.SUBTRACT)

    # Sketch21 → Cut-Extrude14 (cut)
    with BuildSketch(Plane.ZY.offset(63)):
        with Locations((18.5, 10.5)):
            Rectangle(SKETCH21_W, SKETCH21_H)
        with Locations((31, 10.5)):
            Rectangle(SKETCH21_W, SKETCH21_H)
    cut_extrude14 = extrude(amount=-CUT_EXTRUDE14_DEPTH, mode=Mode.SUBTRACT)

    # Mirror1: Cut-Extrude13, Cut-Extrude14 across plane
    add(cut_extrude13.mirror(Plane.ZX), mode=Mode.SUBTRACT)
    add(cut_extrude14.mirror(Plane.ZX), mode=Mode.SUBTRACT)

    # Chamfer4
    chamfer4_edges = [part.edges().sort_by_distance(p)[0] for p in [
        (-65, 0, 25),
        (-65, 6.4, 18.6),
        (-65, 0, 12.2),
        (-65, -6.4, 18.6),
    ]]
    chamfer(chamfer4_edges, length=CHAMFER4_SIZE)

    # Sketch22 → Cut-Extrude15 (cut)
    with BuildSketch(Plane(origin=(-59, 0, 0), x_dir=(0, 0, -1), z_dir=(1, 0, 0))):
        with Locations((-34.3, 0)):
            Rectangle(SKETCH22_W, SKETCH22_H)
    extrude(amount=-CUT_EXTRUDE15_DEPTH, mode=Mode.SUBTRACT)

    # Sketch23 → Boss-Extrude9 (add)
    with BuildSketch(Plane.XY.offset(35)):
        Polygon((-64.4, 13.5), (-63.4, 14.5), (-59, 14.5), (-59, 13.5), align=None)
        Polygon((-59, -13.5), (-64.4, -13.5), (-63.4, -14.5), (-59, -14.5), align=None)
    extrude(amount=-BOSS_EXTRUDE9_DEPTH)

    # Sketch24 → Cut-Extrude16 (cut)
    with BuildSketch(Plane(origin=(-59, 0, 0), x_dir=(0, 0, -1), z_dir=(1, 0, 0))):
        with Locations((-4.27, 0)):
            Rectangle(SKETCH24_W, SKETCH24_H)
    extrude(amount=-CUT_EXTRUDE16_DEPTH, mode=Mode.SUBTRACT)

    # Sketch27 → Boss-Extrude10 (add)
    with BuildSketch(Plane.XY.offset(35)):
        Polygon((-59, 14.5), (-63.4, 14.5), (-65, 12.9), (-65, -12.9), (-63.4, -14.5), (-59, -14.5), align=None)
    extrude(amount=BOSS_EXTRUDE10_DEPTH)

    # Chamfer5
    chamfer5_edges = [part.edges().sort_by_distance(p)[0] for p in [
        (-65, 0, 37),
    ]]
    chamfer(chamfer5_edges, length=CHAMFER5_SIZE)


solid = part.part
